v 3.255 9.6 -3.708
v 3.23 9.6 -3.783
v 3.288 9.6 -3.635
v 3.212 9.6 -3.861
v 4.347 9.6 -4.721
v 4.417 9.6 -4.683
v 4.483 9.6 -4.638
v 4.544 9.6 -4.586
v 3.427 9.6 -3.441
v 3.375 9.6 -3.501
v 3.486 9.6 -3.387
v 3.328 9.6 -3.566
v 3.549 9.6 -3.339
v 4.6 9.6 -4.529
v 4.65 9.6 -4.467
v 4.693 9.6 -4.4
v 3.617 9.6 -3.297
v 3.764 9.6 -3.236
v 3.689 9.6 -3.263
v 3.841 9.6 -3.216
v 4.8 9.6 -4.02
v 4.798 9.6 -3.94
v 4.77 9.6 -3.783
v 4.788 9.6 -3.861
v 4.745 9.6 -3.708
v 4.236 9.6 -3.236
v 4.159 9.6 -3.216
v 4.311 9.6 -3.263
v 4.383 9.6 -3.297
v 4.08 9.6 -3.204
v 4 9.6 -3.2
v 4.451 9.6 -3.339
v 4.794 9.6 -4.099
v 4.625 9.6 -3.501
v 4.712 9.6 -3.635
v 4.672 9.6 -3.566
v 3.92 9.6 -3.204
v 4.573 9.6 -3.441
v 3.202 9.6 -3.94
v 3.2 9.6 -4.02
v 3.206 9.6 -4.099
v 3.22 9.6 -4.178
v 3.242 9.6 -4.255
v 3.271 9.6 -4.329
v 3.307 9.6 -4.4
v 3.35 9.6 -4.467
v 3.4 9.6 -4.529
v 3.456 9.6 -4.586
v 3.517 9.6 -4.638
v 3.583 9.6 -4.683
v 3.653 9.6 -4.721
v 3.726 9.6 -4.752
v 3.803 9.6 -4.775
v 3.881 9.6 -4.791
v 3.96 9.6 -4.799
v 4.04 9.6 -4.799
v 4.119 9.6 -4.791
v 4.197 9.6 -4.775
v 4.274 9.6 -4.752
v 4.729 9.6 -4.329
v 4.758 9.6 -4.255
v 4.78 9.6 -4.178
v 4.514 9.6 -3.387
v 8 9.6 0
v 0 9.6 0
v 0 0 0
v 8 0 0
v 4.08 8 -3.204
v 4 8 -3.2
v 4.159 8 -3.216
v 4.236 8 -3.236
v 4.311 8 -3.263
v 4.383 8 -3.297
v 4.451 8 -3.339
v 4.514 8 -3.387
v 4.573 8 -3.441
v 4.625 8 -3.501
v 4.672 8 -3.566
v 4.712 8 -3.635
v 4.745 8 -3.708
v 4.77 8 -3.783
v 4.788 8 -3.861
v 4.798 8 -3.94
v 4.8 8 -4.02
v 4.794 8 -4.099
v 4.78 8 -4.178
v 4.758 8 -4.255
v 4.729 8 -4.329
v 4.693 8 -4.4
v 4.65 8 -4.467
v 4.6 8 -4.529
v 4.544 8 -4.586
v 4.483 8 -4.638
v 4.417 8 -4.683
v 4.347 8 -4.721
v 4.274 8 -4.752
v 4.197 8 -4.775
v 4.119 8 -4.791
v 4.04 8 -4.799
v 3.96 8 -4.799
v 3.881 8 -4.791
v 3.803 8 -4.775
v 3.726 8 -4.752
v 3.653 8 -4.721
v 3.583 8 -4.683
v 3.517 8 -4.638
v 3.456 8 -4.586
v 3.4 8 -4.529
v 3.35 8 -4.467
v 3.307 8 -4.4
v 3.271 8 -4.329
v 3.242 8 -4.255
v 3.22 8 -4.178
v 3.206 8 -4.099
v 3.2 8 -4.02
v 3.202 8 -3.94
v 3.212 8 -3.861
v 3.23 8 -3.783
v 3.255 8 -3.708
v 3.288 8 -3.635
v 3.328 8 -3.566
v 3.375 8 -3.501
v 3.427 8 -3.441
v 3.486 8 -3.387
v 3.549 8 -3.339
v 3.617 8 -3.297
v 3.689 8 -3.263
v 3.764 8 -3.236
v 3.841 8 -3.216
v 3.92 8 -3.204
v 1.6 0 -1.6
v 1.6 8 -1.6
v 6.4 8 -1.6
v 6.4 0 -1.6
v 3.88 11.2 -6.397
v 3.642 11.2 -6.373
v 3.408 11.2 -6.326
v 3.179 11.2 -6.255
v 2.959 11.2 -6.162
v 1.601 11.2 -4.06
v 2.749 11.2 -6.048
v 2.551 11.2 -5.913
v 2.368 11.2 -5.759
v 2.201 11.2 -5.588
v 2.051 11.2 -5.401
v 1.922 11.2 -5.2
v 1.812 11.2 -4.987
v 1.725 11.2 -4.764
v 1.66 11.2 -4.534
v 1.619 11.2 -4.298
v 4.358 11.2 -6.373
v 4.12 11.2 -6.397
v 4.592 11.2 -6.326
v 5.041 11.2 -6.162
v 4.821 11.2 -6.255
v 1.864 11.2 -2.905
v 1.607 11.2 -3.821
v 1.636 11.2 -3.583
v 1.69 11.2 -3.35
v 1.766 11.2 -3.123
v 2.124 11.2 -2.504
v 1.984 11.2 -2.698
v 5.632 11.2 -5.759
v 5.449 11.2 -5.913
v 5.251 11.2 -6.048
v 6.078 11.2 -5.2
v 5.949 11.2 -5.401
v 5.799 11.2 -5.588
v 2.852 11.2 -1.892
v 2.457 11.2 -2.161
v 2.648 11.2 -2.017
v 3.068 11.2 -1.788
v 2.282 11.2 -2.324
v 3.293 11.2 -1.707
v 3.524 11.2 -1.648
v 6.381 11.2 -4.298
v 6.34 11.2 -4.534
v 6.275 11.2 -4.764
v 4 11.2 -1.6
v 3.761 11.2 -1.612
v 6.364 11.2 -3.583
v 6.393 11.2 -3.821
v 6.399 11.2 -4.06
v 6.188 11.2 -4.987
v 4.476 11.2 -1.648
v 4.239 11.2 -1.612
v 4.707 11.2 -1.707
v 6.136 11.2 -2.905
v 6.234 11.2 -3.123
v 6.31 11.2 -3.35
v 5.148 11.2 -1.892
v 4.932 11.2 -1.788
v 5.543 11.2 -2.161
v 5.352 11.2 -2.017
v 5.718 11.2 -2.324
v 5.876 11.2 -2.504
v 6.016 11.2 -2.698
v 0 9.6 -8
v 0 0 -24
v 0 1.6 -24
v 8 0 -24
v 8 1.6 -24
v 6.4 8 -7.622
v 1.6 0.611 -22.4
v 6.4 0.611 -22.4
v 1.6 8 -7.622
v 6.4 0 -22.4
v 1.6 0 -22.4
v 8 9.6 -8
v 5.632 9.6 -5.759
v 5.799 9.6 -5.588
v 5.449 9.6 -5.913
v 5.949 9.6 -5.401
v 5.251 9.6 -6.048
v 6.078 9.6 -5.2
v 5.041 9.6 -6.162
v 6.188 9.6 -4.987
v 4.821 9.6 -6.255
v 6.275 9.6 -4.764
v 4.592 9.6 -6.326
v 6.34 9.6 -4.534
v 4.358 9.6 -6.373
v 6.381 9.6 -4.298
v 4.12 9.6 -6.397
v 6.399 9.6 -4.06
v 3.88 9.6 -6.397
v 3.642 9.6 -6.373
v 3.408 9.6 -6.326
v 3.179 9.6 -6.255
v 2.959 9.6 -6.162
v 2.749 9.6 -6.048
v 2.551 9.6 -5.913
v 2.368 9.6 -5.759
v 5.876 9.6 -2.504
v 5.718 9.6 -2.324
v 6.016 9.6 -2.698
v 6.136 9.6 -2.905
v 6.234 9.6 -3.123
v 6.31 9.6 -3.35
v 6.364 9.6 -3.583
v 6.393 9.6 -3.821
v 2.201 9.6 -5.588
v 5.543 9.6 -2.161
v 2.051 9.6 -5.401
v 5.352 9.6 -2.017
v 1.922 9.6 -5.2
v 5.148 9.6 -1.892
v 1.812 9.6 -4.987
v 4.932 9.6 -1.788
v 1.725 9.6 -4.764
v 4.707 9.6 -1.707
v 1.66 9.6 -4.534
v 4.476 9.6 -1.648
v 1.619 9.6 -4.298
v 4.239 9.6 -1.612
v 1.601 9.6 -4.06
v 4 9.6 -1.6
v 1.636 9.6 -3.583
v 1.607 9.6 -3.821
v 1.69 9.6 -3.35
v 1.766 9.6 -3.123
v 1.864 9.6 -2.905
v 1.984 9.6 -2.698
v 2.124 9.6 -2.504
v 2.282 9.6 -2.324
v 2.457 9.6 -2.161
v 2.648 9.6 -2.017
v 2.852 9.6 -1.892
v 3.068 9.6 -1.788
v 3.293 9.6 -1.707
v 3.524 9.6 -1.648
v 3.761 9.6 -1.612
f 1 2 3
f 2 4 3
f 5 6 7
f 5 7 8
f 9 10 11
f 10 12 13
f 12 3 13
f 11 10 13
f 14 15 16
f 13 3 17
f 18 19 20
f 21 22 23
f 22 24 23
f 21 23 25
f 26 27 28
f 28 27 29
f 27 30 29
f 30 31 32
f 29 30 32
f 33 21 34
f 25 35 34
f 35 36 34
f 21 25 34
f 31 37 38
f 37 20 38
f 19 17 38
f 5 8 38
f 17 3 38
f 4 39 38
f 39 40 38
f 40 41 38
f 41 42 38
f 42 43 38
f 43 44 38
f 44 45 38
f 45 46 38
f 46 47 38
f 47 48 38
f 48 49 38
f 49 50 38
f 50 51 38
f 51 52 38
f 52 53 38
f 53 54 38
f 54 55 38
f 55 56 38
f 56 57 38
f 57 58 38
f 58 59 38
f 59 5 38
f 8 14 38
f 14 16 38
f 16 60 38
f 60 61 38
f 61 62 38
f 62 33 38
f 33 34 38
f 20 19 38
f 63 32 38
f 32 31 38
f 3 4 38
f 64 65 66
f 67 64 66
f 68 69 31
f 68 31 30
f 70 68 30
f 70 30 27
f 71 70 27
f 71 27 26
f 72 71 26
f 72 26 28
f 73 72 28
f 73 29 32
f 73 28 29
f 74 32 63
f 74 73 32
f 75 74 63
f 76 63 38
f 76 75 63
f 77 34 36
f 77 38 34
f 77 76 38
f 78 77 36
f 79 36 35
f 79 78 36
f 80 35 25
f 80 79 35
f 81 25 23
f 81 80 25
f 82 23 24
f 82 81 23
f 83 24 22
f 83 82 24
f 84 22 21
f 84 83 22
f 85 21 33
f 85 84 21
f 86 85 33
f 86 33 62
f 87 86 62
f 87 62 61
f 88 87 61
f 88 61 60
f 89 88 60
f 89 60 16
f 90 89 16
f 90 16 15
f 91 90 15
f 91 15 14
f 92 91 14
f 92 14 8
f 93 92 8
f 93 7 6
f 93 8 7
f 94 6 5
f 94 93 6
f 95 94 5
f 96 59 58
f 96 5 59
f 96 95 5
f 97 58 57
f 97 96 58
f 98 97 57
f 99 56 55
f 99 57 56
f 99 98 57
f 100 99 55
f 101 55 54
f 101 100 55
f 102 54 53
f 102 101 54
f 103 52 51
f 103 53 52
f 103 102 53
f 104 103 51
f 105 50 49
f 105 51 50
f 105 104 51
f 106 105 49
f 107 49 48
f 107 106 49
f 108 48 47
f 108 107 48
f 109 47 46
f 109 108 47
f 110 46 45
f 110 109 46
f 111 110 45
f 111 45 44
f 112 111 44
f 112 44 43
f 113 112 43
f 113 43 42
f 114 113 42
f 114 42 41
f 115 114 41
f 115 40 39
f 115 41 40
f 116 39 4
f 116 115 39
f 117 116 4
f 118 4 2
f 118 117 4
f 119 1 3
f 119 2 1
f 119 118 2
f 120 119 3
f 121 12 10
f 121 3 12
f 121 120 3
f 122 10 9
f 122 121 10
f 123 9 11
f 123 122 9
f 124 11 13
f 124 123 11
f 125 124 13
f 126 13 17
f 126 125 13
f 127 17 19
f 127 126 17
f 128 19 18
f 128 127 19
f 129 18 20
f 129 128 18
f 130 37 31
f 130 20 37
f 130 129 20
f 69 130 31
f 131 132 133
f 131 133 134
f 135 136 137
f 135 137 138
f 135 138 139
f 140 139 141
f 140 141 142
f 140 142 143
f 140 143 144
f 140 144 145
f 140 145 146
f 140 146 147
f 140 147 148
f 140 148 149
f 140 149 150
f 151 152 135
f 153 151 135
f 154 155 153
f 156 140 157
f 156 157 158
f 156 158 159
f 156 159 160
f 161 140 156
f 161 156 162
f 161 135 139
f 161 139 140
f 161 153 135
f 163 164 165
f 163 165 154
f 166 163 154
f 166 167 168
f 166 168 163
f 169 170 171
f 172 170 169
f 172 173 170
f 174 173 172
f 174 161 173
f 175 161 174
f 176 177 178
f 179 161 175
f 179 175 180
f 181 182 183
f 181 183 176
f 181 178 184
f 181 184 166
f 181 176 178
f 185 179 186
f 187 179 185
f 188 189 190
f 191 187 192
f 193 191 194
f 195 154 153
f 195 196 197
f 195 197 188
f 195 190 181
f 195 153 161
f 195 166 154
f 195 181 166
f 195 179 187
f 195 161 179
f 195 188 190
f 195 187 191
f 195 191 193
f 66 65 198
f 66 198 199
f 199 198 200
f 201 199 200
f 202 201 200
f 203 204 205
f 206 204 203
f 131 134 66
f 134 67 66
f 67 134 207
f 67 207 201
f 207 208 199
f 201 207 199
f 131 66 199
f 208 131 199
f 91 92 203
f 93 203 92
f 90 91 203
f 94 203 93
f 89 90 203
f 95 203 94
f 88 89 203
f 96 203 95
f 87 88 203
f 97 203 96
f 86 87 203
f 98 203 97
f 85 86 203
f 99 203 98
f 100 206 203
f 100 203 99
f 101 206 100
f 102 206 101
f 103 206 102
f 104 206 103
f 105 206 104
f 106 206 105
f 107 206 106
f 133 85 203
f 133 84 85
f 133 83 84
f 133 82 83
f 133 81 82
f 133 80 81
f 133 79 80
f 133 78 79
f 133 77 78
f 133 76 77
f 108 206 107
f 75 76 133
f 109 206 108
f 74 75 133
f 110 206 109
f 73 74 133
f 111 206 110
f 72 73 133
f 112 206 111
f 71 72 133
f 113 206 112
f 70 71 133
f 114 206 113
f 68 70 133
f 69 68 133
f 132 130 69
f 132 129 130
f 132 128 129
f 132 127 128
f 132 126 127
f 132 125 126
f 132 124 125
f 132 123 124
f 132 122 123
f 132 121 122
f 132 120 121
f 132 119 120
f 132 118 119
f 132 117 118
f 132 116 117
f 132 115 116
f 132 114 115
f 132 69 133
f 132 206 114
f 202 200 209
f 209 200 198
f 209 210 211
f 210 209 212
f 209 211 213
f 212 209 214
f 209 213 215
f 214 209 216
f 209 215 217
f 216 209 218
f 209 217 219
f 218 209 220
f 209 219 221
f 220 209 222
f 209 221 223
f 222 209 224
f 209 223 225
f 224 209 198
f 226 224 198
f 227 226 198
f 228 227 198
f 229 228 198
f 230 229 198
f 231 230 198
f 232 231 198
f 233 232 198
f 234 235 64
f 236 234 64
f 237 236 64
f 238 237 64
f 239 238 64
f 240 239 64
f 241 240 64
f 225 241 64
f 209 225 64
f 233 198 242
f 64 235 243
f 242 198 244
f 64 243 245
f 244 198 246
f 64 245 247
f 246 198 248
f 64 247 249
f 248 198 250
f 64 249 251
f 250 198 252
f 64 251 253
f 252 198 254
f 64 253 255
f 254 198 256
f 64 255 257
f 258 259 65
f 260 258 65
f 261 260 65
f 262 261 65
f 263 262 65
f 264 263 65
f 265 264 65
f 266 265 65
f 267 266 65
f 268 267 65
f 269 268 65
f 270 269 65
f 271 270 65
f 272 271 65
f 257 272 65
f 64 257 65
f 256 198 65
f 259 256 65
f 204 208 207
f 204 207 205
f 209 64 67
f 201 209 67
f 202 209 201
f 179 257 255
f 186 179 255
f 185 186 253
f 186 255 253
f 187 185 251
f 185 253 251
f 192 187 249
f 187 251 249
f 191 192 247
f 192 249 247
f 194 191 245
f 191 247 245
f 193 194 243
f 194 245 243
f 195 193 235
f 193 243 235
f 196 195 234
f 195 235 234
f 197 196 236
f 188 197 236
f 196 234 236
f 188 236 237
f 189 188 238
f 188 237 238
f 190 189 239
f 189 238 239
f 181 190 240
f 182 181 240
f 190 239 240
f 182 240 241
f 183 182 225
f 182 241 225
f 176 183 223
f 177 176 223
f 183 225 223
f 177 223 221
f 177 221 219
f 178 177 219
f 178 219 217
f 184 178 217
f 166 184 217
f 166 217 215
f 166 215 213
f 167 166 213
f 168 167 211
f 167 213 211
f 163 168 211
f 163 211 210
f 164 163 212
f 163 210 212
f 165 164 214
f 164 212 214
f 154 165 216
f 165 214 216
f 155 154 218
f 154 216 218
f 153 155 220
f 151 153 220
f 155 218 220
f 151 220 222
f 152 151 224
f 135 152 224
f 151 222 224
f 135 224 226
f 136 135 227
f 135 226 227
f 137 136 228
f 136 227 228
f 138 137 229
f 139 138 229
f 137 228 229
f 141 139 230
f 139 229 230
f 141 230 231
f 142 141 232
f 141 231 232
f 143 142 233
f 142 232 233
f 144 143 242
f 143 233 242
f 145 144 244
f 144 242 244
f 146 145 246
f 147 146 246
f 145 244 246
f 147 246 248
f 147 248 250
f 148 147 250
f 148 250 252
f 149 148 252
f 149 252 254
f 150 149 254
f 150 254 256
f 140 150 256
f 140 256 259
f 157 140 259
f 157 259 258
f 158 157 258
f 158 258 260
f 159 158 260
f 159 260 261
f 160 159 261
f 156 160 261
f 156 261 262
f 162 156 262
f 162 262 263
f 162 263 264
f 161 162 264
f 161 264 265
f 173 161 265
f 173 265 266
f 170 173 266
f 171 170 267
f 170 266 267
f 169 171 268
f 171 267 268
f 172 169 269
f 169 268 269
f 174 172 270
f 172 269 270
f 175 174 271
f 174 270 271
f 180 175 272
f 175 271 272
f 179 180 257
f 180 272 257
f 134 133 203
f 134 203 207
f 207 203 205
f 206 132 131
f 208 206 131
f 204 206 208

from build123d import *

# Parameters (mm, degrees)
BOSS_EXTRUDE1_DEPTH = 8
SKETCH2_R           = 2.4
BOSS_EXTRUDE2_DEPTH = 1.6
SHELL1_T            = -1.6


with BuildPart() as part:
    # Sketch1 → Boss-Extrude1 (new body)
    with BuildSketch(Plane(origin=(0, 0, 0), x_dir=(0, 0, -1), z_dir=(1, 0, 0))):
        Polygon((0, 0), (24, 0), (24, 1.6), (8, 9.6), (0, 9.6), align=None)
    extrude(amount=BOSS_EXTRUDE1_DEPTH)

    # Sketch2 → Boss-Extrude2 (add)
    with BuildSketch(Plane(origin=(0, 9.6, 0), x_dir=(1, 0, 0), z_dir=(0, 1, 0))):
        with Locations(Location((4, 4, 0), (0, 0, 270))):
            Circle(SKETCH2_R)
    extrude(amount=BOSS_EXTRUDE2_DEPTH)

    # Shell1
    shell1_openings = [part.faces().sort_by_distance(p)[0] for p in [
        (4, 0, -12),
    ]]
    offset(amount=SHELL1_T, openings=shell1_openings, kind=Kind.INTERSECTION)


solid = part.part
